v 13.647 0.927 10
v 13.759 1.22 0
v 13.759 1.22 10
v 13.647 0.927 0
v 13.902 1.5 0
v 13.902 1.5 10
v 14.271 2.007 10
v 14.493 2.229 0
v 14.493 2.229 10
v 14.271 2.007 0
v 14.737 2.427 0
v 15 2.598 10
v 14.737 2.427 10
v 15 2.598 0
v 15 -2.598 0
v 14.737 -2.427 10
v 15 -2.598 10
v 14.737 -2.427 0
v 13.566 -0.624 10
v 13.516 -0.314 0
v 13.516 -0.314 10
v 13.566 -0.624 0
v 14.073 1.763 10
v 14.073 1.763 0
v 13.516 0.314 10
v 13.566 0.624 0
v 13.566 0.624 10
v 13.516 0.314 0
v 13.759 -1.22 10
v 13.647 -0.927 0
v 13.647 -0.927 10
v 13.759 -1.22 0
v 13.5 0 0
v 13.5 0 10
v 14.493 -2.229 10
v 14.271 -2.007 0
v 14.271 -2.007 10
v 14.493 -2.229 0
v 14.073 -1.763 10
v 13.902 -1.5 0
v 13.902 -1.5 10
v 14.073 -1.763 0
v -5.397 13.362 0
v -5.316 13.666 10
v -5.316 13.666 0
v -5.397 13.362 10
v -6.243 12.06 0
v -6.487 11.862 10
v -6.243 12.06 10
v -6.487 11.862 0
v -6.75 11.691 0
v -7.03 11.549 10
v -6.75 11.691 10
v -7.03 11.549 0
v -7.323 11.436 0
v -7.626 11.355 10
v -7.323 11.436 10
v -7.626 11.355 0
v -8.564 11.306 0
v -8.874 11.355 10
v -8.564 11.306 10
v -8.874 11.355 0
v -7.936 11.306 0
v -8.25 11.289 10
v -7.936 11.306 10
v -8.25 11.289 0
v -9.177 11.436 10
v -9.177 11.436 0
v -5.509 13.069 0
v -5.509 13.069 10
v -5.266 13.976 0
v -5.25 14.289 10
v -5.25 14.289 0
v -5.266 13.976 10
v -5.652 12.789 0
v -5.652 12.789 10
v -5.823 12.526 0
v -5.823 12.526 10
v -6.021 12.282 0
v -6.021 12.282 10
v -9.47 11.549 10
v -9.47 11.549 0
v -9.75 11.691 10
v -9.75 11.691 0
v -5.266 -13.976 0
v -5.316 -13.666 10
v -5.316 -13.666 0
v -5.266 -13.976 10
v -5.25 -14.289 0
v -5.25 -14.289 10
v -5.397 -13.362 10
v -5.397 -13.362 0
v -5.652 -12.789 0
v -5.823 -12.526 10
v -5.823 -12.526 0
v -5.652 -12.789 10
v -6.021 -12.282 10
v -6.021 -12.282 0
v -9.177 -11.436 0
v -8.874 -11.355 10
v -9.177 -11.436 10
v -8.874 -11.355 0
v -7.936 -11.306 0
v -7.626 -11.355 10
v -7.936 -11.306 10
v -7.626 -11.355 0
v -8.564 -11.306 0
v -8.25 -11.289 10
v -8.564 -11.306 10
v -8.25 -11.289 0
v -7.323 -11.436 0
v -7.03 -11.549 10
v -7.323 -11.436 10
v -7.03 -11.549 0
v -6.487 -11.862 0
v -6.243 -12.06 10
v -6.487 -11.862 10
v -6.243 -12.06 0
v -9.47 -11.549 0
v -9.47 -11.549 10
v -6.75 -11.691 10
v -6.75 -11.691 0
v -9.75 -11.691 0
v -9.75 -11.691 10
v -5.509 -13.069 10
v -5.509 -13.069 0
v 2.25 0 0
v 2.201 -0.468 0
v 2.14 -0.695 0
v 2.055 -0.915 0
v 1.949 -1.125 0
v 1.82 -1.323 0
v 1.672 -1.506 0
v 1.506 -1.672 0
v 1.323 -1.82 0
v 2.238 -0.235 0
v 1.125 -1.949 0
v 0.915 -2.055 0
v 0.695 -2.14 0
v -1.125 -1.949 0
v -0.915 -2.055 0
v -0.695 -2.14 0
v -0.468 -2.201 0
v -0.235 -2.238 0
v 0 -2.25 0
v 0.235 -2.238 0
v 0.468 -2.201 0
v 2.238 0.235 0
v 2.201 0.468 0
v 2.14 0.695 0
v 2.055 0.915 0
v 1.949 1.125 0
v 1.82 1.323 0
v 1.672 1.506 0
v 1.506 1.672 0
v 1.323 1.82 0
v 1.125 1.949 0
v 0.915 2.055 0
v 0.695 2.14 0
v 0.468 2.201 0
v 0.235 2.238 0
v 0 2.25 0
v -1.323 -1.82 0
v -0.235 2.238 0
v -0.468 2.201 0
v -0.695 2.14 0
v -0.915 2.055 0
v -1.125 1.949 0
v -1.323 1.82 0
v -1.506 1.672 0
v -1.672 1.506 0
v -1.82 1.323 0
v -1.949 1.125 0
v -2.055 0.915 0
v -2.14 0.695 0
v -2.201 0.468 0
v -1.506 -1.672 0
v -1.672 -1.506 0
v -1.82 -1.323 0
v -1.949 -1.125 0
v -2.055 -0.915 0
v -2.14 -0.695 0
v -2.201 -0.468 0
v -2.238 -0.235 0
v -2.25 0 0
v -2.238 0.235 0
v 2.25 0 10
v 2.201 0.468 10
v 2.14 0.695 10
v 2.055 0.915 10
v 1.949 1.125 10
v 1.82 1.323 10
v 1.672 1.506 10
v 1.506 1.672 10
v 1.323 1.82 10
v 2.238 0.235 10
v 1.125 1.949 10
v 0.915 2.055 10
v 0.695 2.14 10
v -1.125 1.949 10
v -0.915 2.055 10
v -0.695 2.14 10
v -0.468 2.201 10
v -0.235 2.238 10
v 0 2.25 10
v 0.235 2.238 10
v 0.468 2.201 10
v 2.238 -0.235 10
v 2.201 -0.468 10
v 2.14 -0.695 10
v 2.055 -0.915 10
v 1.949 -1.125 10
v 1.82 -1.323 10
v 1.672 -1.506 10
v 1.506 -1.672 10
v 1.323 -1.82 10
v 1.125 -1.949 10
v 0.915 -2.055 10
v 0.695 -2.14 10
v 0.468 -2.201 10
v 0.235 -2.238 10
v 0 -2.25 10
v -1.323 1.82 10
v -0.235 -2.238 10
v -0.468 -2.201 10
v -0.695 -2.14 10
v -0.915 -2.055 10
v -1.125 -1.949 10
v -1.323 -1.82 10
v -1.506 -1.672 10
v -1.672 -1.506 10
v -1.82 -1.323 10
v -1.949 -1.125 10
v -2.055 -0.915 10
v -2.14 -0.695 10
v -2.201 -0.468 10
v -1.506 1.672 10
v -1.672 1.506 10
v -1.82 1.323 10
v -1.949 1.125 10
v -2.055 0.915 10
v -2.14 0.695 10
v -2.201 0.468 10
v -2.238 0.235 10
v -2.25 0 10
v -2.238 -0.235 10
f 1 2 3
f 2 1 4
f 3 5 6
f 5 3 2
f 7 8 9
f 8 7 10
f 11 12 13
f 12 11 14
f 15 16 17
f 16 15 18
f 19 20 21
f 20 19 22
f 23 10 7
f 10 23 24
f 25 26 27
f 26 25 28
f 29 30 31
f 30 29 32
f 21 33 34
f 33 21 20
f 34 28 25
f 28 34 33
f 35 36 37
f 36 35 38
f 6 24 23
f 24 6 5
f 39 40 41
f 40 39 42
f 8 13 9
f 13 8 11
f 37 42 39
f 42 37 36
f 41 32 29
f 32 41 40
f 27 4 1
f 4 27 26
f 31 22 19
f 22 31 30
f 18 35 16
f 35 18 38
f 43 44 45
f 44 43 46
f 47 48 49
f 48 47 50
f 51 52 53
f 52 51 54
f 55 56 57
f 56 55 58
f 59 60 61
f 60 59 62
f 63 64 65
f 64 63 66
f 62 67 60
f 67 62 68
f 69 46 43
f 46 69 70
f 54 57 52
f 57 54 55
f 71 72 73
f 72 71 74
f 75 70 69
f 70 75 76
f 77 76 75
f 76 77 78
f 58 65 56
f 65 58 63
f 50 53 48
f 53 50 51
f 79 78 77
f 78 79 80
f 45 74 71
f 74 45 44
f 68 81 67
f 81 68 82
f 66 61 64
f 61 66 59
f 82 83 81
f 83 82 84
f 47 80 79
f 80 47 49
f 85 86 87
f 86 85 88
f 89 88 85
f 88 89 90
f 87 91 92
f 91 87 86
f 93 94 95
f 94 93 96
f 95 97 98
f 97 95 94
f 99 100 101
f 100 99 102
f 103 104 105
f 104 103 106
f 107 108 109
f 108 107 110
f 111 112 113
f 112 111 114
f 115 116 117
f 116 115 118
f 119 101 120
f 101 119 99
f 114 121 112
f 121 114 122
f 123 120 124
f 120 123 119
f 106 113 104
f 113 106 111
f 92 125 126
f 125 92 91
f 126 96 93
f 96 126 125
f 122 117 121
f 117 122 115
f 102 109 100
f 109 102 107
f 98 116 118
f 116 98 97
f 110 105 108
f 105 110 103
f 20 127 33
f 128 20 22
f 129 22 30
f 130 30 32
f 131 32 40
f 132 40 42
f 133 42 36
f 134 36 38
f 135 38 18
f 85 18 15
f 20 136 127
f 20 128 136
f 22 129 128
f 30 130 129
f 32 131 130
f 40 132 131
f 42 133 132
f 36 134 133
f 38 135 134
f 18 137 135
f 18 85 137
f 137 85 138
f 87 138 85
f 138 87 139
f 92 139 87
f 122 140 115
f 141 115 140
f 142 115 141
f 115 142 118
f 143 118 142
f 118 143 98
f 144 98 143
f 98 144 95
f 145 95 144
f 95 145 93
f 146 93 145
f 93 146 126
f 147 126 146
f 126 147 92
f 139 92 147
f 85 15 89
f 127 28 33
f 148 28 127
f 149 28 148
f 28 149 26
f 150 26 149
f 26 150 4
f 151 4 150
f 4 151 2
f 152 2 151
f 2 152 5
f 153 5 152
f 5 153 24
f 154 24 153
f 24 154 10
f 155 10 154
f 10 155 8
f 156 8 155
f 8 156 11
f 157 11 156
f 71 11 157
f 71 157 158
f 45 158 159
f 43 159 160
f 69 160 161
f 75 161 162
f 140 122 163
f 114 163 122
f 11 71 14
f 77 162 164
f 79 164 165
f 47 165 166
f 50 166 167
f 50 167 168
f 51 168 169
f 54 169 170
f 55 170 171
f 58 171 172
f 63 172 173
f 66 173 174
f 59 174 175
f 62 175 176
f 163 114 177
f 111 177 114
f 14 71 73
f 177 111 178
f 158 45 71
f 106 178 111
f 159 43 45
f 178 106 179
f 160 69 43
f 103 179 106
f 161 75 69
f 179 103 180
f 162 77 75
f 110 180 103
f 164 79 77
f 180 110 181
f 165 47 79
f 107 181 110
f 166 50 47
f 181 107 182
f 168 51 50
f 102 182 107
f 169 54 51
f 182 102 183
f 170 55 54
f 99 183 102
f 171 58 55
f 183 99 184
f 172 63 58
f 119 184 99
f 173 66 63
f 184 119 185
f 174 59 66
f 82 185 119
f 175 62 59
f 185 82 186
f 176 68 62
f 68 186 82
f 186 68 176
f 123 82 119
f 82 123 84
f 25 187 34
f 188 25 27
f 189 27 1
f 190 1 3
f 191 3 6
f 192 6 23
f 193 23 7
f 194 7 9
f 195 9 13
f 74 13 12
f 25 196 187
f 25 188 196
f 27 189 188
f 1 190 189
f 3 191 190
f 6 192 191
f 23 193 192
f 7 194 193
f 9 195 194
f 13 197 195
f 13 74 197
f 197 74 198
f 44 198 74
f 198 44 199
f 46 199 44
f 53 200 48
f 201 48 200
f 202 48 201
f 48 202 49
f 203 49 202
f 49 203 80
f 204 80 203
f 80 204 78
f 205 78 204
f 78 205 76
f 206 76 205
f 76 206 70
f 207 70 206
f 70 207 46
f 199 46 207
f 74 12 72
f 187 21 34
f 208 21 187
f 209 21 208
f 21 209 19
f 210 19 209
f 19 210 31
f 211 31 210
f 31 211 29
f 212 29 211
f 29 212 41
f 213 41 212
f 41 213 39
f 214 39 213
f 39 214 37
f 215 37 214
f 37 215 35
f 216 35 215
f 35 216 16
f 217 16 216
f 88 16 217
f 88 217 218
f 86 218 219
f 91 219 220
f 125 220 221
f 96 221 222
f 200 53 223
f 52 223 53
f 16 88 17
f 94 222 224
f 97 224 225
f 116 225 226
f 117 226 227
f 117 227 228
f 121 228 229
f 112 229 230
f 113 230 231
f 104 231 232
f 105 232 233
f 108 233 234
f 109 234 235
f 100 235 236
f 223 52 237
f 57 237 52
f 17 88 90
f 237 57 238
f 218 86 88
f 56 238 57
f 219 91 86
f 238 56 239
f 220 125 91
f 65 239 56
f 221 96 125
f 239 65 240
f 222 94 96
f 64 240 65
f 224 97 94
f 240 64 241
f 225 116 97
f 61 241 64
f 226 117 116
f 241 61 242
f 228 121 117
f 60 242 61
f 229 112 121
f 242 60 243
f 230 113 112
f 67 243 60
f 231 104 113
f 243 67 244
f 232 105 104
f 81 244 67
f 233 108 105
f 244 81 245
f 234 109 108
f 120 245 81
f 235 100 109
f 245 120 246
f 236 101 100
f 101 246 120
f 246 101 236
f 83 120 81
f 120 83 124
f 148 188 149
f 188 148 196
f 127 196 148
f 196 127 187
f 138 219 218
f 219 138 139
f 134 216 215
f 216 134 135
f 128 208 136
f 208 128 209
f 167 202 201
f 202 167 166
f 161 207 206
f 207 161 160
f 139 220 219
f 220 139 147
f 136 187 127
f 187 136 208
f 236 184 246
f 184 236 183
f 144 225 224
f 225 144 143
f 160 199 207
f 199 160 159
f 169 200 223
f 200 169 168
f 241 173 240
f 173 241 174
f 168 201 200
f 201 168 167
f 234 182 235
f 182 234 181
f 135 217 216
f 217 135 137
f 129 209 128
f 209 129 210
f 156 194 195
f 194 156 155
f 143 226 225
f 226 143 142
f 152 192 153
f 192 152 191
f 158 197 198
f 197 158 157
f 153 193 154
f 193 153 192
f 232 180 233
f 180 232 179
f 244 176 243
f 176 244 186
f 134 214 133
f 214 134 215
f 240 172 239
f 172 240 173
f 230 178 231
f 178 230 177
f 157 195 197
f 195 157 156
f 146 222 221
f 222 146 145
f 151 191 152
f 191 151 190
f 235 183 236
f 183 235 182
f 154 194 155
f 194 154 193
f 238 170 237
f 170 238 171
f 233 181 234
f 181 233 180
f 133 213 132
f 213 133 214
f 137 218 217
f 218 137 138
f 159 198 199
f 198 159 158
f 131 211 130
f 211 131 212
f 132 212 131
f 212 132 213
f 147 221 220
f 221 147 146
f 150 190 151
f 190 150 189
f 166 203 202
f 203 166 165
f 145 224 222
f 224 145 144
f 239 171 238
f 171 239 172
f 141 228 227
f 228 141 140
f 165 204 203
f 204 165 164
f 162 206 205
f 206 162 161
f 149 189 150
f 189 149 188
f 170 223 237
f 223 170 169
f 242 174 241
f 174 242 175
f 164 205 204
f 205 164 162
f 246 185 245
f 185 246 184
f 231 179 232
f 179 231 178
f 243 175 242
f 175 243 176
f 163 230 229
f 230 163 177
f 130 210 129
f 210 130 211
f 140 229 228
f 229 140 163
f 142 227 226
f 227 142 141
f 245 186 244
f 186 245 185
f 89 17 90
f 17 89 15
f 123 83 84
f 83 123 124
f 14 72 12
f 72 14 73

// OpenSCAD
upper_plate_radius = 19.75;
screw_distance_from_center = 16.5;
screw_hole_diameter = 6; // M3 head is usually 5.5mm
ptfe_hole_diameter = 4.5;
height = 10;
HOLE_BUFFER_HEIGHT = 5;

function polar_to_cartesian(distance_from_center, angle) =
    [distance_from_center * cos(angle), distance_from_center * sin(angle)];

module polar_translate(distance_from_center, angle, z=0) {
    xy = polar_to_cartesian(distance_from_center, angle);
    translate([xy[0], xy[1], z]) children();
}

module polar_equilateral(distance_from_center, height){
    linear_extrude(height = height){
        triangle_points = [
            polar_to_cartesian(distance_from_center, 0),
            polar_to_cartesian(distance_from_center, 120),
            polar_to_cartesian(distance_from_center, 240)
        ];
        polygon(triangle_points);
    };
}

intersection(){
    difference(){
        cylinder(r = upper_plate_radius, h = height);
        
        // Screw Holes
        for(angle=[0:120:359]){
            polar_translate(screw_distance_from_center, angle, -HOLE_BUFFER_HEIGHT)
                cylinder(d = screw_hole_diameter, h = height + (HOLE_BUFFER_HEIGHT * 2), $fn = 60);
        }
        
        // PTFE Tube/Filament Hole
        translate([0, 0, -HOLE_BUFFER_HEIGHT])
            cylinder(d = ptfe_hole_diameter, h = height + (HOLE_BUFFER_HEIGHT * 2), $fn = 60);
    }
    // Trianguar Cut
    translate([0, 0, -HOLE_BUFFER_HEIGHT])
        polar_equilateral(screw_distance_from_center + 3, height + (HOLE_BUFFER_HEIGHT * 2));
}
